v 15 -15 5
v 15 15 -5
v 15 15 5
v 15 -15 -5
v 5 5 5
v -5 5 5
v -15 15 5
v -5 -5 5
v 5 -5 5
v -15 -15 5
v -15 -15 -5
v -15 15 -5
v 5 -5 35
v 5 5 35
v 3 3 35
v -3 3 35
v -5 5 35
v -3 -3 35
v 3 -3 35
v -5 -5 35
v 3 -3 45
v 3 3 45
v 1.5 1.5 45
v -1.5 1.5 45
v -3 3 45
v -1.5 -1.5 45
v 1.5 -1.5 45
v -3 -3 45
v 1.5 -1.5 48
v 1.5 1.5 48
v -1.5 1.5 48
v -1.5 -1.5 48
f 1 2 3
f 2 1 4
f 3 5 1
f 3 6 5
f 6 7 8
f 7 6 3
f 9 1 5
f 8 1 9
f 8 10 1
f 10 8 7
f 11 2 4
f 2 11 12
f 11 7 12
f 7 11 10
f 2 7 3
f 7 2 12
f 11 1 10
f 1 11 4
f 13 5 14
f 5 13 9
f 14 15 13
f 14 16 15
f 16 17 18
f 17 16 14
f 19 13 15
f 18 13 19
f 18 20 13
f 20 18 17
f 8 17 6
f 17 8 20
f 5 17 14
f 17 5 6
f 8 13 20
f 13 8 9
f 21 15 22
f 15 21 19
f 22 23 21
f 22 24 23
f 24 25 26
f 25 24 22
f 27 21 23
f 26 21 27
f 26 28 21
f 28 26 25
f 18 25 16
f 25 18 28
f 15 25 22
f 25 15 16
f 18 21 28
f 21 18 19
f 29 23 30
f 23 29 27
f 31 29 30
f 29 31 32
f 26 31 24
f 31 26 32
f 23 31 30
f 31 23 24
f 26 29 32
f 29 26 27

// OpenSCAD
//-- Definiciones para acceder a las componentes X,Y,Z
//-- Aunque las definimos todas, en este ejemplo solo
//-- accedemos a la componente Z de los cubos
X = 0;
Y = 1;
Z = 2;


//-- Dimensiones de los cubos. Se pueden cambiar por el usuario
//-- Todo se recalculara para que todos los cubos esten apilados
A = [30, 30, 10];
B = [10, 10, 30];
C = [6, 6, 10];
D = [3, 3, 3];

//-- Calcular las posicion de los cubos para que esten apilados
posB = [0, 0, B[Z]/2 + A[Z]/2];
posC = posB + [0, 0, C[Z]/2 + B[Z]/2];
posD = posC + [0, 0, D[Z]/2 + C[Z]/2];


//---- Construccion de la figura a partir de los datos calculados!

//-- Poner el cubo A (es la base)
cube(A, center = true);

//-- Cubo B, encima de A
translate(posB)
  cube(B, center = true);
  
//-- Poner el cubo C encima del B
translate(posC)
  cube(C, center = true);
  
translate(posD)
  cube(D, center = true);
